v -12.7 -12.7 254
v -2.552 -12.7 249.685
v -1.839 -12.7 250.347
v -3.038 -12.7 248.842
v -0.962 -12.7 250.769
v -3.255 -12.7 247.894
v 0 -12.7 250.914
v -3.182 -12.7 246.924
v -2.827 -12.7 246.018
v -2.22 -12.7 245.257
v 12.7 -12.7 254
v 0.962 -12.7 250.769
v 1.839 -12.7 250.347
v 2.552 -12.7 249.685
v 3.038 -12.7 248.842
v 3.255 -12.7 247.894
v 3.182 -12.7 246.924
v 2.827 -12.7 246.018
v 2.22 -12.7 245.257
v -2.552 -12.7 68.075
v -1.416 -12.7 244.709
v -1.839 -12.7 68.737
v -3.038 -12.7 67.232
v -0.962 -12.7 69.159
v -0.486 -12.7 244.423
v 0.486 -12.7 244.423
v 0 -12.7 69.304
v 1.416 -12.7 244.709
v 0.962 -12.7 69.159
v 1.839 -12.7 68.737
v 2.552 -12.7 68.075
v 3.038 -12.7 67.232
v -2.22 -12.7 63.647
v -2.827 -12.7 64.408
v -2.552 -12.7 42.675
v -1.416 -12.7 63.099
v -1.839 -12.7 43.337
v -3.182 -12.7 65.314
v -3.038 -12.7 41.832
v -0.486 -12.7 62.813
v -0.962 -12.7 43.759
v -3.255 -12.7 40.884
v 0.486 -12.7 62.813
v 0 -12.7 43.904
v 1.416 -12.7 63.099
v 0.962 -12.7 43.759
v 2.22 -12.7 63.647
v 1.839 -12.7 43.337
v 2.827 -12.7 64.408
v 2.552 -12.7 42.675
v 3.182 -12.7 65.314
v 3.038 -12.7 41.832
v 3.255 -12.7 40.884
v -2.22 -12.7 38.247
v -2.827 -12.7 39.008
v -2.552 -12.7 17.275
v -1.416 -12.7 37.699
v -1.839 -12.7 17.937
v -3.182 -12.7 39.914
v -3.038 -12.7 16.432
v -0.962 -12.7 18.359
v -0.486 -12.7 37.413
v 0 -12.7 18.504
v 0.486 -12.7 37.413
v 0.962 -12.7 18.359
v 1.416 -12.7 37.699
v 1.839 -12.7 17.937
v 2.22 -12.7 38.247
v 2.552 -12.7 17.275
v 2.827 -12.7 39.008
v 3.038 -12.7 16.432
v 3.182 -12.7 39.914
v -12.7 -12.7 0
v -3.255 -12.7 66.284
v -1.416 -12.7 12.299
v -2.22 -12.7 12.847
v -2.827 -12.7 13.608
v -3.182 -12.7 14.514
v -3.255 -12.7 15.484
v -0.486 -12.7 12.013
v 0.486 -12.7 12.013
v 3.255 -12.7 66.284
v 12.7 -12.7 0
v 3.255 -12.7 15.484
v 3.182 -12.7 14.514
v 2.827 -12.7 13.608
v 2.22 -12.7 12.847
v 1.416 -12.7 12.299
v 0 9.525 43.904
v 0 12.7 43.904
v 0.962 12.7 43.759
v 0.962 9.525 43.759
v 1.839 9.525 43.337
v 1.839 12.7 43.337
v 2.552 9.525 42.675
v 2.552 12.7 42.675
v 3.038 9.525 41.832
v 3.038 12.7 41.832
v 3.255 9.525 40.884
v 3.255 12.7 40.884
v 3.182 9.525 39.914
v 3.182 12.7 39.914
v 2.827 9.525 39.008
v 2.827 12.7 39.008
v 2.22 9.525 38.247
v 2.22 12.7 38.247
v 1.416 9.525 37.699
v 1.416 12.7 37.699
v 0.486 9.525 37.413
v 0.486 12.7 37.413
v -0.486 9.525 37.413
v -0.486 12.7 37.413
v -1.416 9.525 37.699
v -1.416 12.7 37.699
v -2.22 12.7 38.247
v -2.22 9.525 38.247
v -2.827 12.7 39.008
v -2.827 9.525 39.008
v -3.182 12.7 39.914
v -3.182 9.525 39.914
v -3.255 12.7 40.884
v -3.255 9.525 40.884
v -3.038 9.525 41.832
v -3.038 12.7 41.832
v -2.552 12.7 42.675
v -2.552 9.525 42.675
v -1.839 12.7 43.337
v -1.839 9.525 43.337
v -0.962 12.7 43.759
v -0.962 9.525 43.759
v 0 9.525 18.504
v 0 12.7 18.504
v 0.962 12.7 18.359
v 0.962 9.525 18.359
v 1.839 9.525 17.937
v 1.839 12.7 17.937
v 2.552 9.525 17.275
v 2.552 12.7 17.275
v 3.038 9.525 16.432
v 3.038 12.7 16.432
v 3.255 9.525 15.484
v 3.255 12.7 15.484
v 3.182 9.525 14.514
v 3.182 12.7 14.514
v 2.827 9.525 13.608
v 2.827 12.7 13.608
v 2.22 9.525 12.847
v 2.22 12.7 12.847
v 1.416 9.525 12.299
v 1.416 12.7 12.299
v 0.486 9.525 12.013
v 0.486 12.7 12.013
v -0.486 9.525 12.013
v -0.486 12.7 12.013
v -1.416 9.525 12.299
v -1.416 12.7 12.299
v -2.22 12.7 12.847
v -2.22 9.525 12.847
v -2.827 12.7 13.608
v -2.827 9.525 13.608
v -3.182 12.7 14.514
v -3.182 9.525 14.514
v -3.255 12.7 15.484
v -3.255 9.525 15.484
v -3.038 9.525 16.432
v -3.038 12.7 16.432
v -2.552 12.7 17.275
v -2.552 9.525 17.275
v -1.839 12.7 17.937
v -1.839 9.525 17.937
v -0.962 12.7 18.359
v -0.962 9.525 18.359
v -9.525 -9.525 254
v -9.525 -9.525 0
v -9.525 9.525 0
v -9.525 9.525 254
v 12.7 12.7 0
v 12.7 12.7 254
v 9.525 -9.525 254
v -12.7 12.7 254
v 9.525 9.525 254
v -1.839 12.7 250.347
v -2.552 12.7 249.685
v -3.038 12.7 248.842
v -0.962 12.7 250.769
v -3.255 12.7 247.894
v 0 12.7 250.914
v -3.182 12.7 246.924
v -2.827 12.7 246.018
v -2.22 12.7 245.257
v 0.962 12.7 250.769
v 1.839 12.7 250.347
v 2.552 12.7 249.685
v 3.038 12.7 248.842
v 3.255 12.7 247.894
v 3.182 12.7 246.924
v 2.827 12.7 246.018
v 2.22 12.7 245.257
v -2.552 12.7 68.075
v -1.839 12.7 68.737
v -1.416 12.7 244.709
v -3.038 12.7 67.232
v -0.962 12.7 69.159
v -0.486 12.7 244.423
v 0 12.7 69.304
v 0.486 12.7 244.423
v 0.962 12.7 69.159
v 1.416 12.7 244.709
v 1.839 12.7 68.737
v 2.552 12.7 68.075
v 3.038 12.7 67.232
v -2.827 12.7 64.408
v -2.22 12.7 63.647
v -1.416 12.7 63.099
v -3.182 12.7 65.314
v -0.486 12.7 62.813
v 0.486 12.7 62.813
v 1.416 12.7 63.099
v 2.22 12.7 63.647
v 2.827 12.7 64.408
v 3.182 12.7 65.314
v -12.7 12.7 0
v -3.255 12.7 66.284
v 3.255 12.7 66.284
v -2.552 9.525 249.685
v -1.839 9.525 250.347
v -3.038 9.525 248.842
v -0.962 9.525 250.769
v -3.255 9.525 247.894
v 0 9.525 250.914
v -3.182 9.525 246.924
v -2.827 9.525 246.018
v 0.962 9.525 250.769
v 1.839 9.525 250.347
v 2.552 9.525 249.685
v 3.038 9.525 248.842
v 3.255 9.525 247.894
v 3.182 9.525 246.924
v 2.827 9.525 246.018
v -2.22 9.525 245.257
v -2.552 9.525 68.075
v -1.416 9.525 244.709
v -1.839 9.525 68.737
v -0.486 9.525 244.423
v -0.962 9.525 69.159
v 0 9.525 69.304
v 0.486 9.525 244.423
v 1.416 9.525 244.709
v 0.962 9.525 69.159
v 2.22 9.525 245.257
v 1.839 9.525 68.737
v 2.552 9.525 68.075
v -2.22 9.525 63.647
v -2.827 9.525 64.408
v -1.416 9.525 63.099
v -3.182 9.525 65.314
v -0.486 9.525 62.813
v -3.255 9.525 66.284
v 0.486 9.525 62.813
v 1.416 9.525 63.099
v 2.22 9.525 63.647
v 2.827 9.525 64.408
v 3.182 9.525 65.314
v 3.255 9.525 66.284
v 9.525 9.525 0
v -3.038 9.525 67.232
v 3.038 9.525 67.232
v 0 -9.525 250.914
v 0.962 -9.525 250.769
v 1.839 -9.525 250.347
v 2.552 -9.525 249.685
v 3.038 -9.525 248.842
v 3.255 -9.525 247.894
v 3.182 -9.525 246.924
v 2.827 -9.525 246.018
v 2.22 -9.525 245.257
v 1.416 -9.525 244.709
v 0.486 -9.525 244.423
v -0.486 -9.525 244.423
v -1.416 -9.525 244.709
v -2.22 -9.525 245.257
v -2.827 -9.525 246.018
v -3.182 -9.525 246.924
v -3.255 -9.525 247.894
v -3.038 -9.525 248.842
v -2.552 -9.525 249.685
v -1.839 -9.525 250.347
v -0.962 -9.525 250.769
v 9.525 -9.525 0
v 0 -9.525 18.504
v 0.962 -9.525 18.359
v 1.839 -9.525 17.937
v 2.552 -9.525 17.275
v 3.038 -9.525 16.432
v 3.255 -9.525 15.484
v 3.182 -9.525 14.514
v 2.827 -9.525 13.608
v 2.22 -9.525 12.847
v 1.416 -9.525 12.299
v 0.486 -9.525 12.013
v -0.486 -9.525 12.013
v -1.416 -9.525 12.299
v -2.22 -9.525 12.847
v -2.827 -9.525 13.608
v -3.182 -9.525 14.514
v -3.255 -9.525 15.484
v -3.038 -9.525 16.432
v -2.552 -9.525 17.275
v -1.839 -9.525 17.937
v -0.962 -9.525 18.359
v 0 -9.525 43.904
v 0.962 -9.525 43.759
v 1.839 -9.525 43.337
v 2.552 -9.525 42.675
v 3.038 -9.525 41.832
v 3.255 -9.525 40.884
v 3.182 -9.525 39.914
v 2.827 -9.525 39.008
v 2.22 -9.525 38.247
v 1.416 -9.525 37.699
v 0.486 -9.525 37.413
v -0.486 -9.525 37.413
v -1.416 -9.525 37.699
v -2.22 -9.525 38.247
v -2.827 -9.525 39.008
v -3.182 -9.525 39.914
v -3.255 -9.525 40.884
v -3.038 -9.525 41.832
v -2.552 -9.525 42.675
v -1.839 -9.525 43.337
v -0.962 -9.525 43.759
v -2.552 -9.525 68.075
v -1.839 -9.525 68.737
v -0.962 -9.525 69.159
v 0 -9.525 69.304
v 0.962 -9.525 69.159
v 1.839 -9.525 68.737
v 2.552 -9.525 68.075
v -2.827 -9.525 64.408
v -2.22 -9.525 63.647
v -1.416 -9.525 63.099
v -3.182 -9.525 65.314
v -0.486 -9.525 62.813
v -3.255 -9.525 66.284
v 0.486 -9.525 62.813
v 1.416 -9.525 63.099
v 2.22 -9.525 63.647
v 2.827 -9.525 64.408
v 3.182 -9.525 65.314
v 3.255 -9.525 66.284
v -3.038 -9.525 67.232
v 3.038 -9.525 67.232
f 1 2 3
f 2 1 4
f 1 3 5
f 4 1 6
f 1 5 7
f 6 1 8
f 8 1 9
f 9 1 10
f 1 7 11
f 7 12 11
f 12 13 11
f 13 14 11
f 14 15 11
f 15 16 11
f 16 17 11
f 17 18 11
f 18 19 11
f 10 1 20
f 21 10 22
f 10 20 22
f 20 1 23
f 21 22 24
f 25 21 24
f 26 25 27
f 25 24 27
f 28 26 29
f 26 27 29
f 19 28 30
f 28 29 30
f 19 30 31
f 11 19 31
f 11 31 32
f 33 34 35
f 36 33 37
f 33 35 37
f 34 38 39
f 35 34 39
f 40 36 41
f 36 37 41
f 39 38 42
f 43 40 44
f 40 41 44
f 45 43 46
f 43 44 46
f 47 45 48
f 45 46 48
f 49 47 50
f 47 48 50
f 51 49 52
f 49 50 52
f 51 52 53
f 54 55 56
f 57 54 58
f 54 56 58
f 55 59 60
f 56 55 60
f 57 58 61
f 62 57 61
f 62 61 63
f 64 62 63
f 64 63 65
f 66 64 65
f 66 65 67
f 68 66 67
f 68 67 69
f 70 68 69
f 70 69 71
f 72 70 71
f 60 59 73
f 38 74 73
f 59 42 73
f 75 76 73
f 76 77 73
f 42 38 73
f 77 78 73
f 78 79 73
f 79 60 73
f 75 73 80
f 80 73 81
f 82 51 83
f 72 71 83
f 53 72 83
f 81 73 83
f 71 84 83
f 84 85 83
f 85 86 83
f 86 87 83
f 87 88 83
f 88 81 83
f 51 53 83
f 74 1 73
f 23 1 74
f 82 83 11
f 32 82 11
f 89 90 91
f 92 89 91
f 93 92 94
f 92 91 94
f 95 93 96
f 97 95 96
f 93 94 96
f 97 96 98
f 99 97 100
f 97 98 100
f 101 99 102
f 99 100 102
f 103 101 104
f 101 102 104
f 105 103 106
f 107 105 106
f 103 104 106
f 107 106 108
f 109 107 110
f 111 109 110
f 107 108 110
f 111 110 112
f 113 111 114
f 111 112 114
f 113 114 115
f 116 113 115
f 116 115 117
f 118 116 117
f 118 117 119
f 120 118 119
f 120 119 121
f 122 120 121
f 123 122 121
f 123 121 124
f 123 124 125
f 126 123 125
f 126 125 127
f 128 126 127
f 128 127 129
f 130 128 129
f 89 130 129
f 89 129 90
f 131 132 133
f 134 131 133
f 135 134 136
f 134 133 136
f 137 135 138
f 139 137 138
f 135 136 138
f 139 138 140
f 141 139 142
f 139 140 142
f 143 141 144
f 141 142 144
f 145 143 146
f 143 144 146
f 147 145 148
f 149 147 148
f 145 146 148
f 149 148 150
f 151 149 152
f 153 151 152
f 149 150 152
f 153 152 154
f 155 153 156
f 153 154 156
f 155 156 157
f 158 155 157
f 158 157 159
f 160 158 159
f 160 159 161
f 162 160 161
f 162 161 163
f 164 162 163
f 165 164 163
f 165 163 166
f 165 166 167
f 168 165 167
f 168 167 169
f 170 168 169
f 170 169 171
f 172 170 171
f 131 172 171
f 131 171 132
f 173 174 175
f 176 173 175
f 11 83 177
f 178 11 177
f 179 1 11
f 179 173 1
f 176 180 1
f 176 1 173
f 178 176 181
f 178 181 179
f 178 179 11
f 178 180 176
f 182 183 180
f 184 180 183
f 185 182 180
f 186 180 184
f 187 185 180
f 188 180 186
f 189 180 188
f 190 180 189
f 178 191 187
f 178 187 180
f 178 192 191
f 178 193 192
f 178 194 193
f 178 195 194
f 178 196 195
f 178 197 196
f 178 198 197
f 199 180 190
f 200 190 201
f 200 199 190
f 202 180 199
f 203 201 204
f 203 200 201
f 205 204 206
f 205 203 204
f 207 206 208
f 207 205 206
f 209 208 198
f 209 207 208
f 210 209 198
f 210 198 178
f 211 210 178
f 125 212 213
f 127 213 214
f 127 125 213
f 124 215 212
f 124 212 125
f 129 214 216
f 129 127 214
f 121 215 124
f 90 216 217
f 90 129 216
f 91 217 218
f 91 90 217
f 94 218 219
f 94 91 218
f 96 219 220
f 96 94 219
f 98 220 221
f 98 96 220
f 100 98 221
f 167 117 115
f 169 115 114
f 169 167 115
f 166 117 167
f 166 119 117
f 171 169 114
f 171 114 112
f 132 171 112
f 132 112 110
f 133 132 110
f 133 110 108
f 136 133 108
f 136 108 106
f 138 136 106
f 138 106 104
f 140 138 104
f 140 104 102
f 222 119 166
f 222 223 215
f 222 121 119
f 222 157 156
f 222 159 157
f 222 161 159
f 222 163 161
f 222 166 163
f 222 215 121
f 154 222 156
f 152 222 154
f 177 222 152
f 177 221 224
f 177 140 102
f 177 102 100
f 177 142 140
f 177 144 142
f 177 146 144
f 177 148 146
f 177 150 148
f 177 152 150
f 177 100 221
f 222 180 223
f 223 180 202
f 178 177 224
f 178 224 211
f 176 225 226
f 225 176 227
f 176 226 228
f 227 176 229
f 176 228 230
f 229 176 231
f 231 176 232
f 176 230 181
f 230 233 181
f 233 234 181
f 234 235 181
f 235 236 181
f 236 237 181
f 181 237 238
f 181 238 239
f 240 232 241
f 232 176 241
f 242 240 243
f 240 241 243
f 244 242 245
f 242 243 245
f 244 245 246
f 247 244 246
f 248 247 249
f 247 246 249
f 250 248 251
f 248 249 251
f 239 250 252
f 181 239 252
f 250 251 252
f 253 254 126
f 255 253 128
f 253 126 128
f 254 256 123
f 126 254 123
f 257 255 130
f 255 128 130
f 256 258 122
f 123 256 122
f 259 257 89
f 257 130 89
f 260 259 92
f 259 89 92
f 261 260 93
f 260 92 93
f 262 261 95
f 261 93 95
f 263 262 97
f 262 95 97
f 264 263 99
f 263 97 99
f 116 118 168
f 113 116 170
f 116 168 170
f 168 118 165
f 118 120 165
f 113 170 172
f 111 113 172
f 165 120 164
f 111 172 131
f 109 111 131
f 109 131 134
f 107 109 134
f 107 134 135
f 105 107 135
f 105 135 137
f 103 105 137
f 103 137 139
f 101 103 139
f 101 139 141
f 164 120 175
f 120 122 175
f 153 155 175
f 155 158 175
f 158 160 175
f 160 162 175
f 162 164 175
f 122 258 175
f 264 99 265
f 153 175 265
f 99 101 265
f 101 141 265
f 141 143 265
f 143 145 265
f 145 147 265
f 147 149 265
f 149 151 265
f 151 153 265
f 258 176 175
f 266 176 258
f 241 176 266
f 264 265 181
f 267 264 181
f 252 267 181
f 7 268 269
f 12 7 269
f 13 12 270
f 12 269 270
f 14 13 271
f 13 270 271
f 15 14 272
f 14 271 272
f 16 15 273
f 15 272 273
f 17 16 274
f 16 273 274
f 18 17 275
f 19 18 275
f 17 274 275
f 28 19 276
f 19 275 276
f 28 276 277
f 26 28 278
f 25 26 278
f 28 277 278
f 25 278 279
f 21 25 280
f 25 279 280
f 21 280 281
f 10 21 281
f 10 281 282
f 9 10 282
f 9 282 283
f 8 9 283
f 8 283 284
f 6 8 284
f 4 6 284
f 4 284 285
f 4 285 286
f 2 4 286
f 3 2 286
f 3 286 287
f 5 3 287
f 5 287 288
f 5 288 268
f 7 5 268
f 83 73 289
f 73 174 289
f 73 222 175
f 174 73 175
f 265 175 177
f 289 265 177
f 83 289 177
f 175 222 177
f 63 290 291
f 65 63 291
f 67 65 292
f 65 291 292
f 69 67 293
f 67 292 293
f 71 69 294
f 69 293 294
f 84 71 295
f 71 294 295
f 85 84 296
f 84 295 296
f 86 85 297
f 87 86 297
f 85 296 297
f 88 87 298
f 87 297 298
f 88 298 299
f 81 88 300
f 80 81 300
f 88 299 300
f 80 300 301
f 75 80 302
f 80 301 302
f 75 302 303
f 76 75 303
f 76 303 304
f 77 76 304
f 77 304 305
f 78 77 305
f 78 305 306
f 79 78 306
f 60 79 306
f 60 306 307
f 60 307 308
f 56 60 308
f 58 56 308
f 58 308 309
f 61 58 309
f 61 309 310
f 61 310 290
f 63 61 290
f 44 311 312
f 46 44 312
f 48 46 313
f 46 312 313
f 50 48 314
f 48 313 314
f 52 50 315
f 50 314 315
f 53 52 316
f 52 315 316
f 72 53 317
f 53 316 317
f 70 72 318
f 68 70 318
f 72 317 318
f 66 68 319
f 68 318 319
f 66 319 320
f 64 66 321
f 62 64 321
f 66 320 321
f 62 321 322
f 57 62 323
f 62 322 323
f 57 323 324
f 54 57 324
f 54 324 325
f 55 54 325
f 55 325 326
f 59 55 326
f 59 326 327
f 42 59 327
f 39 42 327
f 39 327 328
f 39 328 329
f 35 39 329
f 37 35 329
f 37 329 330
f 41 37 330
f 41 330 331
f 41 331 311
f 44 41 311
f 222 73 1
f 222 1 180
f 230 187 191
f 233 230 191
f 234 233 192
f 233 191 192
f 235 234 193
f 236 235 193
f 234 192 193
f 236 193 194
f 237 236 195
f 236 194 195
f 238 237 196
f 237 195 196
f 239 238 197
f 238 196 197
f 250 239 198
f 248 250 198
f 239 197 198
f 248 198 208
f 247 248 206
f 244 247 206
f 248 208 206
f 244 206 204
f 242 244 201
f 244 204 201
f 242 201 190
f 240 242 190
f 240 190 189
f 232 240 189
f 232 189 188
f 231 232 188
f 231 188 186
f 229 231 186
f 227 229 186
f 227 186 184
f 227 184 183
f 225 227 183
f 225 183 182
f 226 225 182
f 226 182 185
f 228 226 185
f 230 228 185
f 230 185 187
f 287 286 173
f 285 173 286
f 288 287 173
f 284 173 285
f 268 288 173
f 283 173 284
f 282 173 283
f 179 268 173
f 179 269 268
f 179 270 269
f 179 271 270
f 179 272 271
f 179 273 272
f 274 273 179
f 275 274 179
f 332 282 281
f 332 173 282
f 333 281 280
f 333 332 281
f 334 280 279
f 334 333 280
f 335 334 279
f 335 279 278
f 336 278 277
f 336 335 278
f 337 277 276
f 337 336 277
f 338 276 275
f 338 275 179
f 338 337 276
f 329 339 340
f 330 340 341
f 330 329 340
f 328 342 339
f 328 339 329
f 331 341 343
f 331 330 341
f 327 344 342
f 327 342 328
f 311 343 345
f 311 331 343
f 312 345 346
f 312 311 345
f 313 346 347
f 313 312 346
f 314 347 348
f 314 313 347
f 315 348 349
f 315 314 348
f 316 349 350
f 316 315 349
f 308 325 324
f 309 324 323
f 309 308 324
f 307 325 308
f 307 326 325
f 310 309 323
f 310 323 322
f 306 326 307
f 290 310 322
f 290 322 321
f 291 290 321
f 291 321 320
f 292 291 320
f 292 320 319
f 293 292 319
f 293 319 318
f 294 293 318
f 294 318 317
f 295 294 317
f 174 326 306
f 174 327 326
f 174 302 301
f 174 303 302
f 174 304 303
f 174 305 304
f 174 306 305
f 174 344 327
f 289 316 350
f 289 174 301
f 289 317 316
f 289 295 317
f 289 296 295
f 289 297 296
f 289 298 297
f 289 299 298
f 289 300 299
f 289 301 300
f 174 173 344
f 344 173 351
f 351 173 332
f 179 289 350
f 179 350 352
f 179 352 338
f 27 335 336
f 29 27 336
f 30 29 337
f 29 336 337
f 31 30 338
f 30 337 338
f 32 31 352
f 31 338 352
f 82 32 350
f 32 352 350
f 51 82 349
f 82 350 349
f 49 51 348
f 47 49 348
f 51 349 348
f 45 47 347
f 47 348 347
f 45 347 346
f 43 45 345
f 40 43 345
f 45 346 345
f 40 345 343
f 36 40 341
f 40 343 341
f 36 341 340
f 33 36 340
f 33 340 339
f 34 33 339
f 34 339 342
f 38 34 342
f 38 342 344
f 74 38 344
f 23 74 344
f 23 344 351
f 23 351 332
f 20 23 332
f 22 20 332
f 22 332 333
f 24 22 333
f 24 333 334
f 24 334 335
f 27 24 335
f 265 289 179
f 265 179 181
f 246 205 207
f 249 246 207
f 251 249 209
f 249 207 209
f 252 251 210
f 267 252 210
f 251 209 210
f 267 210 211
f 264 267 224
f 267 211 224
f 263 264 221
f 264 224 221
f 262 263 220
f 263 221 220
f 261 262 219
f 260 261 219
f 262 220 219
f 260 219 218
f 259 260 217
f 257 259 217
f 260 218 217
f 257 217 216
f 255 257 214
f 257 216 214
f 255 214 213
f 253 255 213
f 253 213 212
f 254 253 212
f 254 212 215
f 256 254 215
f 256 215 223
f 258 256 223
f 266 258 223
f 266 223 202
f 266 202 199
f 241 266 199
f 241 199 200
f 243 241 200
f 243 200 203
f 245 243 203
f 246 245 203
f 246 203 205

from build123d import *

# Parameters (mm, degrees)
SKETCH2_W           = 25.4
SKETCH2_H           = 25.4
BOSS_EXTRUDE1_DEPTH = 254
SKETCH4_W           = 19.05
SKETCH4_H           = 19.05
CUT_EXTRUDE1_DEPTH  = 255.634208228
SKETCH5_R           = 3.2639
CUT_EXTRUDE2_DEPTH  = 304.8
SKETCH6_R           = 3.2639
CUT_EXTRUDE3_DEPTH  = 256.582569828
SKETCH8_R           = 3.2639
CUT_EXTRUDE4_DEPTH  = 256.582569828


with BuildPart() as part:
    # Sketch2 → Boss-Extrude1 (new body)
    with BuildSketch(Plane.XY):
        Rectangle(SKETCH2_W, SKETCH2_H)
    extrude(amount=BOSS_EXTRUDE1_DEPTH)

    # Sketch4 → Cut-Extrude1 (cut, through all)
    with BuildSketch(Plane.XY):
        Rectangle(SKETCH4_W, SKETCH4_H)
    extrude(amount=CUT_EXTRUDE1_DEPTH, mode=Mode.SUBTRACT)

    # Sketch5 → Cut-Extrude2 (cut)
    with BuildSketch(Plane(origin=(0, 12.7, 0), x_dir=(1, 0, 0), z_dir=(0, 1, 0))):
        with Locations(Location((0, -15.24, 0), (0, 0, 270))):
            Circle(SKETCH5_R)
    extrude(amount=-CUT_EXTRUDE2_DEPTH, mode=Mode.SUBTRACT)

    # Sketch6 → Cut-Extrude3 (cut, through all)
    with BuildSketch(Plane(origin=(0, 12.7, 0), x_dir=(1, 0, 0), z_dir=(0, 1, 0))):
        with Locations(Location((0, -247.65, 0), (0, 0, 270))):
            Circle(SKETCH6_R)
    extrude(amount=-CUT_EXTRUDE3_DEPTH, mode=Mode.SUBTRACT)

    # Sketch8 → Cut-Extrude4 (cut, through all)
    with BuildSketch(Plane(origin=(0, 12.7, 0), x_dir=(1, 0, 0), z_dir=(0, 1, 0))):
        with Locations(Location((0, -66.04, 0), (0, 0, 270))):
            Circle(SKETCH8_R)
        with Locations(Location((0, -40.64, 0), (0, 0, 270))):
            Circle(SKETCH8_R)
    extrude(amount=-CUT_EXTRUDE4_DEPTH, mode=Mode.SUBTRACT)


solid = part.part
